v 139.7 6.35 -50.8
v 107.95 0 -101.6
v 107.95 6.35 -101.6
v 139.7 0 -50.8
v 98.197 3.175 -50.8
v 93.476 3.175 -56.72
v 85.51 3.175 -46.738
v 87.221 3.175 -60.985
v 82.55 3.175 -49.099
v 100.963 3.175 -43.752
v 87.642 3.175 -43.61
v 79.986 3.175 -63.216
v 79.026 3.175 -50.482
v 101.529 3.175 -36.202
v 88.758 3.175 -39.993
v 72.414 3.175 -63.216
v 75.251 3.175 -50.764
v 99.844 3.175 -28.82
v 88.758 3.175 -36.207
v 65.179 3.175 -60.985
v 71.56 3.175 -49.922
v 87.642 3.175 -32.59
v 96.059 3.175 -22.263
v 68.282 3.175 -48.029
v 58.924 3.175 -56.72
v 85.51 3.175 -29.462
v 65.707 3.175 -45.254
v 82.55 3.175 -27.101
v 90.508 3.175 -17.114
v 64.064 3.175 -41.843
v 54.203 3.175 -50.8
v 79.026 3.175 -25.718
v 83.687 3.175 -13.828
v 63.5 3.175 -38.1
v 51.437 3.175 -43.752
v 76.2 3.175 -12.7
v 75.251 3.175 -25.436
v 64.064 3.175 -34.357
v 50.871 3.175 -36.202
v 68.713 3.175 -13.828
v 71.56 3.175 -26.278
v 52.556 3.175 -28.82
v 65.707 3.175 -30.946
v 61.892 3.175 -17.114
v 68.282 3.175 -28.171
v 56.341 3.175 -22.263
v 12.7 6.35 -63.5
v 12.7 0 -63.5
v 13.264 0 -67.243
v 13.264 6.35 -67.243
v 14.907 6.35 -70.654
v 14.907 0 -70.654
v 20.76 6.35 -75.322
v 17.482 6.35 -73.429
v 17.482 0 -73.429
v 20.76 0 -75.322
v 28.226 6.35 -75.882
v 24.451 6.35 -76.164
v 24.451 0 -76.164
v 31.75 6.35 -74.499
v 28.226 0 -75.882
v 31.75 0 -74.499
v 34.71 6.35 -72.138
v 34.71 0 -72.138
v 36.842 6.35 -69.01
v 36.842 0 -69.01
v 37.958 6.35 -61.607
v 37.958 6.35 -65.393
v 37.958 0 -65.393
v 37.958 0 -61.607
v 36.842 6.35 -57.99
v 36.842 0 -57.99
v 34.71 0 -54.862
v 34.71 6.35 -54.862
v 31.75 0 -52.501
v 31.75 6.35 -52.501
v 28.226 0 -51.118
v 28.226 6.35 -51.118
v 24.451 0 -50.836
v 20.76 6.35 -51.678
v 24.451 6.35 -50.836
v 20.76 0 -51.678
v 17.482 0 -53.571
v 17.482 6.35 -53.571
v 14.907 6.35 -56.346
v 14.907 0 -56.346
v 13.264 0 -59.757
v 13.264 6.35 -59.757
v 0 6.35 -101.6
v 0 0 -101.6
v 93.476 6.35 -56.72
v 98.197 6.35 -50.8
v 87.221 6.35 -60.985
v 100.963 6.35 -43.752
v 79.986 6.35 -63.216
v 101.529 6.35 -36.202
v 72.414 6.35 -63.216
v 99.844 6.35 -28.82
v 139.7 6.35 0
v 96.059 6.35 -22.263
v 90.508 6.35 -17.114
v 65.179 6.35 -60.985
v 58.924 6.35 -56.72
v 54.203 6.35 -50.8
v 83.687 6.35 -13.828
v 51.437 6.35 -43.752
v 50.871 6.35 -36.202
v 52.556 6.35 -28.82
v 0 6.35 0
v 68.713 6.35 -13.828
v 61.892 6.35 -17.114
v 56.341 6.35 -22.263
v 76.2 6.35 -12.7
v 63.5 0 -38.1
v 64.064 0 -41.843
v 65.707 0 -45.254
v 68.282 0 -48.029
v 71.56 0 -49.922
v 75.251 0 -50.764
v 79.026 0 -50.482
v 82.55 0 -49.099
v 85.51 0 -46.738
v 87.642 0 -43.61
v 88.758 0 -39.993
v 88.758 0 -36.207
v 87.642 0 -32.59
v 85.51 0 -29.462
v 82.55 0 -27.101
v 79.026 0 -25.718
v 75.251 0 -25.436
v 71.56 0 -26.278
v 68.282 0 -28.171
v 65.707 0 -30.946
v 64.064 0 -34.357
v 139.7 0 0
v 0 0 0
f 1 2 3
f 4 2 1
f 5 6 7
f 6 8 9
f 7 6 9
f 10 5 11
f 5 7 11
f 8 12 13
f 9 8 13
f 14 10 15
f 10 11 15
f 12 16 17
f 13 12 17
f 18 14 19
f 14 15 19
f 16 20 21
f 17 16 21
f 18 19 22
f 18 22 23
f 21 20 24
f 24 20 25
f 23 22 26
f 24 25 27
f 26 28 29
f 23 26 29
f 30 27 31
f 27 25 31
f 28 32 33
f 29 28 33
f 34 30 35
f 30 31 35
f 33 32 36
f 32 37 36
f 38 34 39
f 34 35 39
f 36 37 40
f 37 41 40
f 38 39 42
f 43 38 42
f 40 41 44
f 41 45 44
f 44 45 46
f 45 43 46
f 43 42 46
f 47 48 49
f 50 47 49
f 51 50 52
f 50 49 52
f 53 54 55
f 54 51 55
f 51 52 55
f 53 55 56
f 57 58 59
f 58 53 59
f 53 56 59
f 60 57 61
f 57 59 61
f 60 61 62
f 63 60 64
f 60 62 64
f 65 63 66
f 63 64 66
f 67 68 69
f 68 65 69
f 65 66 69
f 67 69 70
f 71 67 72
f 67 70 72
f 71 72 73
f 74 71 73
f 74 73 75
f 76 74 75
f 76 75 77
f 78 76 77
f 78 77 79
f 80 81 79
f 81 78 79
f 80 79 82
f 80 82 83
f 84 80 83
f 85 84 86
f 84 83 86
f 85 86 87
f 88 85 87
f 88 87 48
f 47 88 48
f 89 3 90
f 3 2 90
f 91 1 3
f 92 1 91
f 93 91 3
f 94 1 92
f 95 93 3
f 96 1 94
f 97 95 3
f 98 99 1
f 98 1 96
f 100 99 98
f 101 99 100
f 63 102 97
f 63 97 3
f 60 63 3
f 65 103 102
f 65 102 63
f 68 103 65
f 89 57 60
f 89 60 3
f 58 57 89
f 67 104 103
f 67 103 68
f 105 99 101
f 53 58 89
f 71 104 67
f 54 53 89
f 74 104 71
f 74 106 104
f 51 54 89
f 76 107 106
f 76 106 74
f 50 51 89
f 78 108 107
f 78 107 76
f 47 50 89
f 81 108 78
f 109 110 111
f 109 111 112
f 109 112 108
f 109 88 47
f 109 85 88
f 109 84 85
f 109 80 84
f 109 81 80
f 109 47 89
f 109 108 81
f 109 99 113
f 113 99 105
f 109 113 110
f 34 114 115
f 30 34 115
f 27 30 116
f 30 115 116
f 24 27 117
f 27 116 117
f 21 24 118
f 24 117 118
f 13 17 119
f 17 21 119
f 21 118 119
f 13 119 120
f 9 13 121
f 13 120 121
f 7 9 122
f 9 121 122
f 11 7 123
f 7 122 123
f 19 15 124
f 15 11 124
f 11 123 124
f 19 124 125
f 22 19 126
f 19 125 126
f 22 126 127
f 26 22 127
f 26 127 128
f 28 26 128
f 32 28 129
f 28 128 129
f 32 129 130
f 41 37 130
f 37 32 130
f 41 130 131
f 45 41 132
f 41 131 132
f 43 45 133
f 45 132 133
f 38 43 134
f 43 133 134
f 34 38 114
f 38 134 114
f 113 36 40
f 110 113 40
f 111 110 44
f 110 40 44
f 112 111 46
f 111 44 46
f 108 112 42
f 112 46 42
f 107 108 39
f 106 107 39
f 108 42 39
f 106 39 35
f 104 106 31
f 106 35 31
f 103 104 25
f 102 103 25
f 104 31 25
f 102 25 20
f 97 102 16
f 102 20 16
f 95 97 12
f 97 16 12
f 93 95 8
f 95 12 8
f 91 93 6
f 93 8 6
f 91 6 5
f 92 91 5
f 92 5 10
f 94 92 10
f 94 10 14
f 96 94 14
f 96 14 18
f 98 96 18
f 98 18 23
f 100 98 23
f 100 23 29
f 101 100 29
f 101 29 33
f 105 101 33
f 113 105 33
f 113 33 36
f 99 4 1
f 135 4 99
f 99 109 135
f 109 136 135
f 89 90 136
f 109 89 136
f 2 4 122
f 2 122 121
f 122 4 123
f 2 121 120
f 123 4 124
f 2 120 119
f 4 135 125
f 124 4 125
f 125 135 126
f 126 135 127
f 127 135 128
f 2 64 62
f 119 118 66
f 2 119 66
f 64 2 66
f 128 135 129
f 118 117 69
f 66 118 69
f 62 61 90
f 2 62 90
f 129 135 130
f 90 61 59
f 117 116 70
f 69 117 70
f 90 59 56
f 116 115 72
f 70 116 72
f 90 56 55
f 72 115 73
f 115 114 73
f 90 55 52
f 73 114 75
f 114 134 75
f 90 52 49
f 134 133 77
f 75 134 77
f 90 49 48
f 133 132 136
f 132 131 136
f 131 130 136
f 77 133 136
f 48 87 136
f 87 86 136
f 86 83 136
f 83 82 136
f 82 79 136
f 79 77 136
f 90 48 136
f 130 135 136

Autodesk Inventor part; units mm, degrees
ref_plane "YZ Plane" through (0, 0, 0) normal (1, 0, 0) x (0, 1, 0)
ref_plane "XZ Plane" through (0, 0, 0) normal (0, 1, 0) x (-1, 0, 0)
ref_plane "XY Plane" through (0, 0, 0) normal (0, 0, 1) x (1, 0, 0)
sketch "Sketch1" plane through (0, 0, 0) normal (0, 1, 0) x (-1, 0, 0)
  line L0 (0, 0) -> (-139.7, 0)
  line L1 (-107.95, -101.6) -> (0, -101.6)
  line L2 (0, -101.6) -> (0, 0)
  line L3 (-107.95, -101.6) -> (-139.7, -50.8)
  line L4 (-139.7, -50.8) -> (-139.7, 0)
  circle A0 centre (-25.4, -63.5) radius 12.7
  circle A1 centre (-76.2, -38.1) radius 12.7
  dimension "d0" = 50.8
  dimension "d1" = 101.6
  dimension "d2" = 107.95
  dimension "d3" = 139.7
  dimension "d5" = 25.4
  dimension "d6" = 63.5
  dimension "d7" = 38.1
  dimension "d8" = 76.2
  dimension "d9" = 25.4
extrude "Extrusion1" add sketch "Sketch1" along normal blind 6.35
sketch "Sketch2" plane through (0, 6.35, 0) normal (0, 1, 0) x (1, 0, 0)
  circle A0 centre (76.2, 38.1) radius 12.7 projected
  point P0 (0, 0)
hole "Hole1" at (76.2, 6.35, -38.1) direction (0, -1, 0) diameter 25.4 end through all counterbore diameter 50.8 counterbore depth 3.175
properties part number "GuidePlate"
